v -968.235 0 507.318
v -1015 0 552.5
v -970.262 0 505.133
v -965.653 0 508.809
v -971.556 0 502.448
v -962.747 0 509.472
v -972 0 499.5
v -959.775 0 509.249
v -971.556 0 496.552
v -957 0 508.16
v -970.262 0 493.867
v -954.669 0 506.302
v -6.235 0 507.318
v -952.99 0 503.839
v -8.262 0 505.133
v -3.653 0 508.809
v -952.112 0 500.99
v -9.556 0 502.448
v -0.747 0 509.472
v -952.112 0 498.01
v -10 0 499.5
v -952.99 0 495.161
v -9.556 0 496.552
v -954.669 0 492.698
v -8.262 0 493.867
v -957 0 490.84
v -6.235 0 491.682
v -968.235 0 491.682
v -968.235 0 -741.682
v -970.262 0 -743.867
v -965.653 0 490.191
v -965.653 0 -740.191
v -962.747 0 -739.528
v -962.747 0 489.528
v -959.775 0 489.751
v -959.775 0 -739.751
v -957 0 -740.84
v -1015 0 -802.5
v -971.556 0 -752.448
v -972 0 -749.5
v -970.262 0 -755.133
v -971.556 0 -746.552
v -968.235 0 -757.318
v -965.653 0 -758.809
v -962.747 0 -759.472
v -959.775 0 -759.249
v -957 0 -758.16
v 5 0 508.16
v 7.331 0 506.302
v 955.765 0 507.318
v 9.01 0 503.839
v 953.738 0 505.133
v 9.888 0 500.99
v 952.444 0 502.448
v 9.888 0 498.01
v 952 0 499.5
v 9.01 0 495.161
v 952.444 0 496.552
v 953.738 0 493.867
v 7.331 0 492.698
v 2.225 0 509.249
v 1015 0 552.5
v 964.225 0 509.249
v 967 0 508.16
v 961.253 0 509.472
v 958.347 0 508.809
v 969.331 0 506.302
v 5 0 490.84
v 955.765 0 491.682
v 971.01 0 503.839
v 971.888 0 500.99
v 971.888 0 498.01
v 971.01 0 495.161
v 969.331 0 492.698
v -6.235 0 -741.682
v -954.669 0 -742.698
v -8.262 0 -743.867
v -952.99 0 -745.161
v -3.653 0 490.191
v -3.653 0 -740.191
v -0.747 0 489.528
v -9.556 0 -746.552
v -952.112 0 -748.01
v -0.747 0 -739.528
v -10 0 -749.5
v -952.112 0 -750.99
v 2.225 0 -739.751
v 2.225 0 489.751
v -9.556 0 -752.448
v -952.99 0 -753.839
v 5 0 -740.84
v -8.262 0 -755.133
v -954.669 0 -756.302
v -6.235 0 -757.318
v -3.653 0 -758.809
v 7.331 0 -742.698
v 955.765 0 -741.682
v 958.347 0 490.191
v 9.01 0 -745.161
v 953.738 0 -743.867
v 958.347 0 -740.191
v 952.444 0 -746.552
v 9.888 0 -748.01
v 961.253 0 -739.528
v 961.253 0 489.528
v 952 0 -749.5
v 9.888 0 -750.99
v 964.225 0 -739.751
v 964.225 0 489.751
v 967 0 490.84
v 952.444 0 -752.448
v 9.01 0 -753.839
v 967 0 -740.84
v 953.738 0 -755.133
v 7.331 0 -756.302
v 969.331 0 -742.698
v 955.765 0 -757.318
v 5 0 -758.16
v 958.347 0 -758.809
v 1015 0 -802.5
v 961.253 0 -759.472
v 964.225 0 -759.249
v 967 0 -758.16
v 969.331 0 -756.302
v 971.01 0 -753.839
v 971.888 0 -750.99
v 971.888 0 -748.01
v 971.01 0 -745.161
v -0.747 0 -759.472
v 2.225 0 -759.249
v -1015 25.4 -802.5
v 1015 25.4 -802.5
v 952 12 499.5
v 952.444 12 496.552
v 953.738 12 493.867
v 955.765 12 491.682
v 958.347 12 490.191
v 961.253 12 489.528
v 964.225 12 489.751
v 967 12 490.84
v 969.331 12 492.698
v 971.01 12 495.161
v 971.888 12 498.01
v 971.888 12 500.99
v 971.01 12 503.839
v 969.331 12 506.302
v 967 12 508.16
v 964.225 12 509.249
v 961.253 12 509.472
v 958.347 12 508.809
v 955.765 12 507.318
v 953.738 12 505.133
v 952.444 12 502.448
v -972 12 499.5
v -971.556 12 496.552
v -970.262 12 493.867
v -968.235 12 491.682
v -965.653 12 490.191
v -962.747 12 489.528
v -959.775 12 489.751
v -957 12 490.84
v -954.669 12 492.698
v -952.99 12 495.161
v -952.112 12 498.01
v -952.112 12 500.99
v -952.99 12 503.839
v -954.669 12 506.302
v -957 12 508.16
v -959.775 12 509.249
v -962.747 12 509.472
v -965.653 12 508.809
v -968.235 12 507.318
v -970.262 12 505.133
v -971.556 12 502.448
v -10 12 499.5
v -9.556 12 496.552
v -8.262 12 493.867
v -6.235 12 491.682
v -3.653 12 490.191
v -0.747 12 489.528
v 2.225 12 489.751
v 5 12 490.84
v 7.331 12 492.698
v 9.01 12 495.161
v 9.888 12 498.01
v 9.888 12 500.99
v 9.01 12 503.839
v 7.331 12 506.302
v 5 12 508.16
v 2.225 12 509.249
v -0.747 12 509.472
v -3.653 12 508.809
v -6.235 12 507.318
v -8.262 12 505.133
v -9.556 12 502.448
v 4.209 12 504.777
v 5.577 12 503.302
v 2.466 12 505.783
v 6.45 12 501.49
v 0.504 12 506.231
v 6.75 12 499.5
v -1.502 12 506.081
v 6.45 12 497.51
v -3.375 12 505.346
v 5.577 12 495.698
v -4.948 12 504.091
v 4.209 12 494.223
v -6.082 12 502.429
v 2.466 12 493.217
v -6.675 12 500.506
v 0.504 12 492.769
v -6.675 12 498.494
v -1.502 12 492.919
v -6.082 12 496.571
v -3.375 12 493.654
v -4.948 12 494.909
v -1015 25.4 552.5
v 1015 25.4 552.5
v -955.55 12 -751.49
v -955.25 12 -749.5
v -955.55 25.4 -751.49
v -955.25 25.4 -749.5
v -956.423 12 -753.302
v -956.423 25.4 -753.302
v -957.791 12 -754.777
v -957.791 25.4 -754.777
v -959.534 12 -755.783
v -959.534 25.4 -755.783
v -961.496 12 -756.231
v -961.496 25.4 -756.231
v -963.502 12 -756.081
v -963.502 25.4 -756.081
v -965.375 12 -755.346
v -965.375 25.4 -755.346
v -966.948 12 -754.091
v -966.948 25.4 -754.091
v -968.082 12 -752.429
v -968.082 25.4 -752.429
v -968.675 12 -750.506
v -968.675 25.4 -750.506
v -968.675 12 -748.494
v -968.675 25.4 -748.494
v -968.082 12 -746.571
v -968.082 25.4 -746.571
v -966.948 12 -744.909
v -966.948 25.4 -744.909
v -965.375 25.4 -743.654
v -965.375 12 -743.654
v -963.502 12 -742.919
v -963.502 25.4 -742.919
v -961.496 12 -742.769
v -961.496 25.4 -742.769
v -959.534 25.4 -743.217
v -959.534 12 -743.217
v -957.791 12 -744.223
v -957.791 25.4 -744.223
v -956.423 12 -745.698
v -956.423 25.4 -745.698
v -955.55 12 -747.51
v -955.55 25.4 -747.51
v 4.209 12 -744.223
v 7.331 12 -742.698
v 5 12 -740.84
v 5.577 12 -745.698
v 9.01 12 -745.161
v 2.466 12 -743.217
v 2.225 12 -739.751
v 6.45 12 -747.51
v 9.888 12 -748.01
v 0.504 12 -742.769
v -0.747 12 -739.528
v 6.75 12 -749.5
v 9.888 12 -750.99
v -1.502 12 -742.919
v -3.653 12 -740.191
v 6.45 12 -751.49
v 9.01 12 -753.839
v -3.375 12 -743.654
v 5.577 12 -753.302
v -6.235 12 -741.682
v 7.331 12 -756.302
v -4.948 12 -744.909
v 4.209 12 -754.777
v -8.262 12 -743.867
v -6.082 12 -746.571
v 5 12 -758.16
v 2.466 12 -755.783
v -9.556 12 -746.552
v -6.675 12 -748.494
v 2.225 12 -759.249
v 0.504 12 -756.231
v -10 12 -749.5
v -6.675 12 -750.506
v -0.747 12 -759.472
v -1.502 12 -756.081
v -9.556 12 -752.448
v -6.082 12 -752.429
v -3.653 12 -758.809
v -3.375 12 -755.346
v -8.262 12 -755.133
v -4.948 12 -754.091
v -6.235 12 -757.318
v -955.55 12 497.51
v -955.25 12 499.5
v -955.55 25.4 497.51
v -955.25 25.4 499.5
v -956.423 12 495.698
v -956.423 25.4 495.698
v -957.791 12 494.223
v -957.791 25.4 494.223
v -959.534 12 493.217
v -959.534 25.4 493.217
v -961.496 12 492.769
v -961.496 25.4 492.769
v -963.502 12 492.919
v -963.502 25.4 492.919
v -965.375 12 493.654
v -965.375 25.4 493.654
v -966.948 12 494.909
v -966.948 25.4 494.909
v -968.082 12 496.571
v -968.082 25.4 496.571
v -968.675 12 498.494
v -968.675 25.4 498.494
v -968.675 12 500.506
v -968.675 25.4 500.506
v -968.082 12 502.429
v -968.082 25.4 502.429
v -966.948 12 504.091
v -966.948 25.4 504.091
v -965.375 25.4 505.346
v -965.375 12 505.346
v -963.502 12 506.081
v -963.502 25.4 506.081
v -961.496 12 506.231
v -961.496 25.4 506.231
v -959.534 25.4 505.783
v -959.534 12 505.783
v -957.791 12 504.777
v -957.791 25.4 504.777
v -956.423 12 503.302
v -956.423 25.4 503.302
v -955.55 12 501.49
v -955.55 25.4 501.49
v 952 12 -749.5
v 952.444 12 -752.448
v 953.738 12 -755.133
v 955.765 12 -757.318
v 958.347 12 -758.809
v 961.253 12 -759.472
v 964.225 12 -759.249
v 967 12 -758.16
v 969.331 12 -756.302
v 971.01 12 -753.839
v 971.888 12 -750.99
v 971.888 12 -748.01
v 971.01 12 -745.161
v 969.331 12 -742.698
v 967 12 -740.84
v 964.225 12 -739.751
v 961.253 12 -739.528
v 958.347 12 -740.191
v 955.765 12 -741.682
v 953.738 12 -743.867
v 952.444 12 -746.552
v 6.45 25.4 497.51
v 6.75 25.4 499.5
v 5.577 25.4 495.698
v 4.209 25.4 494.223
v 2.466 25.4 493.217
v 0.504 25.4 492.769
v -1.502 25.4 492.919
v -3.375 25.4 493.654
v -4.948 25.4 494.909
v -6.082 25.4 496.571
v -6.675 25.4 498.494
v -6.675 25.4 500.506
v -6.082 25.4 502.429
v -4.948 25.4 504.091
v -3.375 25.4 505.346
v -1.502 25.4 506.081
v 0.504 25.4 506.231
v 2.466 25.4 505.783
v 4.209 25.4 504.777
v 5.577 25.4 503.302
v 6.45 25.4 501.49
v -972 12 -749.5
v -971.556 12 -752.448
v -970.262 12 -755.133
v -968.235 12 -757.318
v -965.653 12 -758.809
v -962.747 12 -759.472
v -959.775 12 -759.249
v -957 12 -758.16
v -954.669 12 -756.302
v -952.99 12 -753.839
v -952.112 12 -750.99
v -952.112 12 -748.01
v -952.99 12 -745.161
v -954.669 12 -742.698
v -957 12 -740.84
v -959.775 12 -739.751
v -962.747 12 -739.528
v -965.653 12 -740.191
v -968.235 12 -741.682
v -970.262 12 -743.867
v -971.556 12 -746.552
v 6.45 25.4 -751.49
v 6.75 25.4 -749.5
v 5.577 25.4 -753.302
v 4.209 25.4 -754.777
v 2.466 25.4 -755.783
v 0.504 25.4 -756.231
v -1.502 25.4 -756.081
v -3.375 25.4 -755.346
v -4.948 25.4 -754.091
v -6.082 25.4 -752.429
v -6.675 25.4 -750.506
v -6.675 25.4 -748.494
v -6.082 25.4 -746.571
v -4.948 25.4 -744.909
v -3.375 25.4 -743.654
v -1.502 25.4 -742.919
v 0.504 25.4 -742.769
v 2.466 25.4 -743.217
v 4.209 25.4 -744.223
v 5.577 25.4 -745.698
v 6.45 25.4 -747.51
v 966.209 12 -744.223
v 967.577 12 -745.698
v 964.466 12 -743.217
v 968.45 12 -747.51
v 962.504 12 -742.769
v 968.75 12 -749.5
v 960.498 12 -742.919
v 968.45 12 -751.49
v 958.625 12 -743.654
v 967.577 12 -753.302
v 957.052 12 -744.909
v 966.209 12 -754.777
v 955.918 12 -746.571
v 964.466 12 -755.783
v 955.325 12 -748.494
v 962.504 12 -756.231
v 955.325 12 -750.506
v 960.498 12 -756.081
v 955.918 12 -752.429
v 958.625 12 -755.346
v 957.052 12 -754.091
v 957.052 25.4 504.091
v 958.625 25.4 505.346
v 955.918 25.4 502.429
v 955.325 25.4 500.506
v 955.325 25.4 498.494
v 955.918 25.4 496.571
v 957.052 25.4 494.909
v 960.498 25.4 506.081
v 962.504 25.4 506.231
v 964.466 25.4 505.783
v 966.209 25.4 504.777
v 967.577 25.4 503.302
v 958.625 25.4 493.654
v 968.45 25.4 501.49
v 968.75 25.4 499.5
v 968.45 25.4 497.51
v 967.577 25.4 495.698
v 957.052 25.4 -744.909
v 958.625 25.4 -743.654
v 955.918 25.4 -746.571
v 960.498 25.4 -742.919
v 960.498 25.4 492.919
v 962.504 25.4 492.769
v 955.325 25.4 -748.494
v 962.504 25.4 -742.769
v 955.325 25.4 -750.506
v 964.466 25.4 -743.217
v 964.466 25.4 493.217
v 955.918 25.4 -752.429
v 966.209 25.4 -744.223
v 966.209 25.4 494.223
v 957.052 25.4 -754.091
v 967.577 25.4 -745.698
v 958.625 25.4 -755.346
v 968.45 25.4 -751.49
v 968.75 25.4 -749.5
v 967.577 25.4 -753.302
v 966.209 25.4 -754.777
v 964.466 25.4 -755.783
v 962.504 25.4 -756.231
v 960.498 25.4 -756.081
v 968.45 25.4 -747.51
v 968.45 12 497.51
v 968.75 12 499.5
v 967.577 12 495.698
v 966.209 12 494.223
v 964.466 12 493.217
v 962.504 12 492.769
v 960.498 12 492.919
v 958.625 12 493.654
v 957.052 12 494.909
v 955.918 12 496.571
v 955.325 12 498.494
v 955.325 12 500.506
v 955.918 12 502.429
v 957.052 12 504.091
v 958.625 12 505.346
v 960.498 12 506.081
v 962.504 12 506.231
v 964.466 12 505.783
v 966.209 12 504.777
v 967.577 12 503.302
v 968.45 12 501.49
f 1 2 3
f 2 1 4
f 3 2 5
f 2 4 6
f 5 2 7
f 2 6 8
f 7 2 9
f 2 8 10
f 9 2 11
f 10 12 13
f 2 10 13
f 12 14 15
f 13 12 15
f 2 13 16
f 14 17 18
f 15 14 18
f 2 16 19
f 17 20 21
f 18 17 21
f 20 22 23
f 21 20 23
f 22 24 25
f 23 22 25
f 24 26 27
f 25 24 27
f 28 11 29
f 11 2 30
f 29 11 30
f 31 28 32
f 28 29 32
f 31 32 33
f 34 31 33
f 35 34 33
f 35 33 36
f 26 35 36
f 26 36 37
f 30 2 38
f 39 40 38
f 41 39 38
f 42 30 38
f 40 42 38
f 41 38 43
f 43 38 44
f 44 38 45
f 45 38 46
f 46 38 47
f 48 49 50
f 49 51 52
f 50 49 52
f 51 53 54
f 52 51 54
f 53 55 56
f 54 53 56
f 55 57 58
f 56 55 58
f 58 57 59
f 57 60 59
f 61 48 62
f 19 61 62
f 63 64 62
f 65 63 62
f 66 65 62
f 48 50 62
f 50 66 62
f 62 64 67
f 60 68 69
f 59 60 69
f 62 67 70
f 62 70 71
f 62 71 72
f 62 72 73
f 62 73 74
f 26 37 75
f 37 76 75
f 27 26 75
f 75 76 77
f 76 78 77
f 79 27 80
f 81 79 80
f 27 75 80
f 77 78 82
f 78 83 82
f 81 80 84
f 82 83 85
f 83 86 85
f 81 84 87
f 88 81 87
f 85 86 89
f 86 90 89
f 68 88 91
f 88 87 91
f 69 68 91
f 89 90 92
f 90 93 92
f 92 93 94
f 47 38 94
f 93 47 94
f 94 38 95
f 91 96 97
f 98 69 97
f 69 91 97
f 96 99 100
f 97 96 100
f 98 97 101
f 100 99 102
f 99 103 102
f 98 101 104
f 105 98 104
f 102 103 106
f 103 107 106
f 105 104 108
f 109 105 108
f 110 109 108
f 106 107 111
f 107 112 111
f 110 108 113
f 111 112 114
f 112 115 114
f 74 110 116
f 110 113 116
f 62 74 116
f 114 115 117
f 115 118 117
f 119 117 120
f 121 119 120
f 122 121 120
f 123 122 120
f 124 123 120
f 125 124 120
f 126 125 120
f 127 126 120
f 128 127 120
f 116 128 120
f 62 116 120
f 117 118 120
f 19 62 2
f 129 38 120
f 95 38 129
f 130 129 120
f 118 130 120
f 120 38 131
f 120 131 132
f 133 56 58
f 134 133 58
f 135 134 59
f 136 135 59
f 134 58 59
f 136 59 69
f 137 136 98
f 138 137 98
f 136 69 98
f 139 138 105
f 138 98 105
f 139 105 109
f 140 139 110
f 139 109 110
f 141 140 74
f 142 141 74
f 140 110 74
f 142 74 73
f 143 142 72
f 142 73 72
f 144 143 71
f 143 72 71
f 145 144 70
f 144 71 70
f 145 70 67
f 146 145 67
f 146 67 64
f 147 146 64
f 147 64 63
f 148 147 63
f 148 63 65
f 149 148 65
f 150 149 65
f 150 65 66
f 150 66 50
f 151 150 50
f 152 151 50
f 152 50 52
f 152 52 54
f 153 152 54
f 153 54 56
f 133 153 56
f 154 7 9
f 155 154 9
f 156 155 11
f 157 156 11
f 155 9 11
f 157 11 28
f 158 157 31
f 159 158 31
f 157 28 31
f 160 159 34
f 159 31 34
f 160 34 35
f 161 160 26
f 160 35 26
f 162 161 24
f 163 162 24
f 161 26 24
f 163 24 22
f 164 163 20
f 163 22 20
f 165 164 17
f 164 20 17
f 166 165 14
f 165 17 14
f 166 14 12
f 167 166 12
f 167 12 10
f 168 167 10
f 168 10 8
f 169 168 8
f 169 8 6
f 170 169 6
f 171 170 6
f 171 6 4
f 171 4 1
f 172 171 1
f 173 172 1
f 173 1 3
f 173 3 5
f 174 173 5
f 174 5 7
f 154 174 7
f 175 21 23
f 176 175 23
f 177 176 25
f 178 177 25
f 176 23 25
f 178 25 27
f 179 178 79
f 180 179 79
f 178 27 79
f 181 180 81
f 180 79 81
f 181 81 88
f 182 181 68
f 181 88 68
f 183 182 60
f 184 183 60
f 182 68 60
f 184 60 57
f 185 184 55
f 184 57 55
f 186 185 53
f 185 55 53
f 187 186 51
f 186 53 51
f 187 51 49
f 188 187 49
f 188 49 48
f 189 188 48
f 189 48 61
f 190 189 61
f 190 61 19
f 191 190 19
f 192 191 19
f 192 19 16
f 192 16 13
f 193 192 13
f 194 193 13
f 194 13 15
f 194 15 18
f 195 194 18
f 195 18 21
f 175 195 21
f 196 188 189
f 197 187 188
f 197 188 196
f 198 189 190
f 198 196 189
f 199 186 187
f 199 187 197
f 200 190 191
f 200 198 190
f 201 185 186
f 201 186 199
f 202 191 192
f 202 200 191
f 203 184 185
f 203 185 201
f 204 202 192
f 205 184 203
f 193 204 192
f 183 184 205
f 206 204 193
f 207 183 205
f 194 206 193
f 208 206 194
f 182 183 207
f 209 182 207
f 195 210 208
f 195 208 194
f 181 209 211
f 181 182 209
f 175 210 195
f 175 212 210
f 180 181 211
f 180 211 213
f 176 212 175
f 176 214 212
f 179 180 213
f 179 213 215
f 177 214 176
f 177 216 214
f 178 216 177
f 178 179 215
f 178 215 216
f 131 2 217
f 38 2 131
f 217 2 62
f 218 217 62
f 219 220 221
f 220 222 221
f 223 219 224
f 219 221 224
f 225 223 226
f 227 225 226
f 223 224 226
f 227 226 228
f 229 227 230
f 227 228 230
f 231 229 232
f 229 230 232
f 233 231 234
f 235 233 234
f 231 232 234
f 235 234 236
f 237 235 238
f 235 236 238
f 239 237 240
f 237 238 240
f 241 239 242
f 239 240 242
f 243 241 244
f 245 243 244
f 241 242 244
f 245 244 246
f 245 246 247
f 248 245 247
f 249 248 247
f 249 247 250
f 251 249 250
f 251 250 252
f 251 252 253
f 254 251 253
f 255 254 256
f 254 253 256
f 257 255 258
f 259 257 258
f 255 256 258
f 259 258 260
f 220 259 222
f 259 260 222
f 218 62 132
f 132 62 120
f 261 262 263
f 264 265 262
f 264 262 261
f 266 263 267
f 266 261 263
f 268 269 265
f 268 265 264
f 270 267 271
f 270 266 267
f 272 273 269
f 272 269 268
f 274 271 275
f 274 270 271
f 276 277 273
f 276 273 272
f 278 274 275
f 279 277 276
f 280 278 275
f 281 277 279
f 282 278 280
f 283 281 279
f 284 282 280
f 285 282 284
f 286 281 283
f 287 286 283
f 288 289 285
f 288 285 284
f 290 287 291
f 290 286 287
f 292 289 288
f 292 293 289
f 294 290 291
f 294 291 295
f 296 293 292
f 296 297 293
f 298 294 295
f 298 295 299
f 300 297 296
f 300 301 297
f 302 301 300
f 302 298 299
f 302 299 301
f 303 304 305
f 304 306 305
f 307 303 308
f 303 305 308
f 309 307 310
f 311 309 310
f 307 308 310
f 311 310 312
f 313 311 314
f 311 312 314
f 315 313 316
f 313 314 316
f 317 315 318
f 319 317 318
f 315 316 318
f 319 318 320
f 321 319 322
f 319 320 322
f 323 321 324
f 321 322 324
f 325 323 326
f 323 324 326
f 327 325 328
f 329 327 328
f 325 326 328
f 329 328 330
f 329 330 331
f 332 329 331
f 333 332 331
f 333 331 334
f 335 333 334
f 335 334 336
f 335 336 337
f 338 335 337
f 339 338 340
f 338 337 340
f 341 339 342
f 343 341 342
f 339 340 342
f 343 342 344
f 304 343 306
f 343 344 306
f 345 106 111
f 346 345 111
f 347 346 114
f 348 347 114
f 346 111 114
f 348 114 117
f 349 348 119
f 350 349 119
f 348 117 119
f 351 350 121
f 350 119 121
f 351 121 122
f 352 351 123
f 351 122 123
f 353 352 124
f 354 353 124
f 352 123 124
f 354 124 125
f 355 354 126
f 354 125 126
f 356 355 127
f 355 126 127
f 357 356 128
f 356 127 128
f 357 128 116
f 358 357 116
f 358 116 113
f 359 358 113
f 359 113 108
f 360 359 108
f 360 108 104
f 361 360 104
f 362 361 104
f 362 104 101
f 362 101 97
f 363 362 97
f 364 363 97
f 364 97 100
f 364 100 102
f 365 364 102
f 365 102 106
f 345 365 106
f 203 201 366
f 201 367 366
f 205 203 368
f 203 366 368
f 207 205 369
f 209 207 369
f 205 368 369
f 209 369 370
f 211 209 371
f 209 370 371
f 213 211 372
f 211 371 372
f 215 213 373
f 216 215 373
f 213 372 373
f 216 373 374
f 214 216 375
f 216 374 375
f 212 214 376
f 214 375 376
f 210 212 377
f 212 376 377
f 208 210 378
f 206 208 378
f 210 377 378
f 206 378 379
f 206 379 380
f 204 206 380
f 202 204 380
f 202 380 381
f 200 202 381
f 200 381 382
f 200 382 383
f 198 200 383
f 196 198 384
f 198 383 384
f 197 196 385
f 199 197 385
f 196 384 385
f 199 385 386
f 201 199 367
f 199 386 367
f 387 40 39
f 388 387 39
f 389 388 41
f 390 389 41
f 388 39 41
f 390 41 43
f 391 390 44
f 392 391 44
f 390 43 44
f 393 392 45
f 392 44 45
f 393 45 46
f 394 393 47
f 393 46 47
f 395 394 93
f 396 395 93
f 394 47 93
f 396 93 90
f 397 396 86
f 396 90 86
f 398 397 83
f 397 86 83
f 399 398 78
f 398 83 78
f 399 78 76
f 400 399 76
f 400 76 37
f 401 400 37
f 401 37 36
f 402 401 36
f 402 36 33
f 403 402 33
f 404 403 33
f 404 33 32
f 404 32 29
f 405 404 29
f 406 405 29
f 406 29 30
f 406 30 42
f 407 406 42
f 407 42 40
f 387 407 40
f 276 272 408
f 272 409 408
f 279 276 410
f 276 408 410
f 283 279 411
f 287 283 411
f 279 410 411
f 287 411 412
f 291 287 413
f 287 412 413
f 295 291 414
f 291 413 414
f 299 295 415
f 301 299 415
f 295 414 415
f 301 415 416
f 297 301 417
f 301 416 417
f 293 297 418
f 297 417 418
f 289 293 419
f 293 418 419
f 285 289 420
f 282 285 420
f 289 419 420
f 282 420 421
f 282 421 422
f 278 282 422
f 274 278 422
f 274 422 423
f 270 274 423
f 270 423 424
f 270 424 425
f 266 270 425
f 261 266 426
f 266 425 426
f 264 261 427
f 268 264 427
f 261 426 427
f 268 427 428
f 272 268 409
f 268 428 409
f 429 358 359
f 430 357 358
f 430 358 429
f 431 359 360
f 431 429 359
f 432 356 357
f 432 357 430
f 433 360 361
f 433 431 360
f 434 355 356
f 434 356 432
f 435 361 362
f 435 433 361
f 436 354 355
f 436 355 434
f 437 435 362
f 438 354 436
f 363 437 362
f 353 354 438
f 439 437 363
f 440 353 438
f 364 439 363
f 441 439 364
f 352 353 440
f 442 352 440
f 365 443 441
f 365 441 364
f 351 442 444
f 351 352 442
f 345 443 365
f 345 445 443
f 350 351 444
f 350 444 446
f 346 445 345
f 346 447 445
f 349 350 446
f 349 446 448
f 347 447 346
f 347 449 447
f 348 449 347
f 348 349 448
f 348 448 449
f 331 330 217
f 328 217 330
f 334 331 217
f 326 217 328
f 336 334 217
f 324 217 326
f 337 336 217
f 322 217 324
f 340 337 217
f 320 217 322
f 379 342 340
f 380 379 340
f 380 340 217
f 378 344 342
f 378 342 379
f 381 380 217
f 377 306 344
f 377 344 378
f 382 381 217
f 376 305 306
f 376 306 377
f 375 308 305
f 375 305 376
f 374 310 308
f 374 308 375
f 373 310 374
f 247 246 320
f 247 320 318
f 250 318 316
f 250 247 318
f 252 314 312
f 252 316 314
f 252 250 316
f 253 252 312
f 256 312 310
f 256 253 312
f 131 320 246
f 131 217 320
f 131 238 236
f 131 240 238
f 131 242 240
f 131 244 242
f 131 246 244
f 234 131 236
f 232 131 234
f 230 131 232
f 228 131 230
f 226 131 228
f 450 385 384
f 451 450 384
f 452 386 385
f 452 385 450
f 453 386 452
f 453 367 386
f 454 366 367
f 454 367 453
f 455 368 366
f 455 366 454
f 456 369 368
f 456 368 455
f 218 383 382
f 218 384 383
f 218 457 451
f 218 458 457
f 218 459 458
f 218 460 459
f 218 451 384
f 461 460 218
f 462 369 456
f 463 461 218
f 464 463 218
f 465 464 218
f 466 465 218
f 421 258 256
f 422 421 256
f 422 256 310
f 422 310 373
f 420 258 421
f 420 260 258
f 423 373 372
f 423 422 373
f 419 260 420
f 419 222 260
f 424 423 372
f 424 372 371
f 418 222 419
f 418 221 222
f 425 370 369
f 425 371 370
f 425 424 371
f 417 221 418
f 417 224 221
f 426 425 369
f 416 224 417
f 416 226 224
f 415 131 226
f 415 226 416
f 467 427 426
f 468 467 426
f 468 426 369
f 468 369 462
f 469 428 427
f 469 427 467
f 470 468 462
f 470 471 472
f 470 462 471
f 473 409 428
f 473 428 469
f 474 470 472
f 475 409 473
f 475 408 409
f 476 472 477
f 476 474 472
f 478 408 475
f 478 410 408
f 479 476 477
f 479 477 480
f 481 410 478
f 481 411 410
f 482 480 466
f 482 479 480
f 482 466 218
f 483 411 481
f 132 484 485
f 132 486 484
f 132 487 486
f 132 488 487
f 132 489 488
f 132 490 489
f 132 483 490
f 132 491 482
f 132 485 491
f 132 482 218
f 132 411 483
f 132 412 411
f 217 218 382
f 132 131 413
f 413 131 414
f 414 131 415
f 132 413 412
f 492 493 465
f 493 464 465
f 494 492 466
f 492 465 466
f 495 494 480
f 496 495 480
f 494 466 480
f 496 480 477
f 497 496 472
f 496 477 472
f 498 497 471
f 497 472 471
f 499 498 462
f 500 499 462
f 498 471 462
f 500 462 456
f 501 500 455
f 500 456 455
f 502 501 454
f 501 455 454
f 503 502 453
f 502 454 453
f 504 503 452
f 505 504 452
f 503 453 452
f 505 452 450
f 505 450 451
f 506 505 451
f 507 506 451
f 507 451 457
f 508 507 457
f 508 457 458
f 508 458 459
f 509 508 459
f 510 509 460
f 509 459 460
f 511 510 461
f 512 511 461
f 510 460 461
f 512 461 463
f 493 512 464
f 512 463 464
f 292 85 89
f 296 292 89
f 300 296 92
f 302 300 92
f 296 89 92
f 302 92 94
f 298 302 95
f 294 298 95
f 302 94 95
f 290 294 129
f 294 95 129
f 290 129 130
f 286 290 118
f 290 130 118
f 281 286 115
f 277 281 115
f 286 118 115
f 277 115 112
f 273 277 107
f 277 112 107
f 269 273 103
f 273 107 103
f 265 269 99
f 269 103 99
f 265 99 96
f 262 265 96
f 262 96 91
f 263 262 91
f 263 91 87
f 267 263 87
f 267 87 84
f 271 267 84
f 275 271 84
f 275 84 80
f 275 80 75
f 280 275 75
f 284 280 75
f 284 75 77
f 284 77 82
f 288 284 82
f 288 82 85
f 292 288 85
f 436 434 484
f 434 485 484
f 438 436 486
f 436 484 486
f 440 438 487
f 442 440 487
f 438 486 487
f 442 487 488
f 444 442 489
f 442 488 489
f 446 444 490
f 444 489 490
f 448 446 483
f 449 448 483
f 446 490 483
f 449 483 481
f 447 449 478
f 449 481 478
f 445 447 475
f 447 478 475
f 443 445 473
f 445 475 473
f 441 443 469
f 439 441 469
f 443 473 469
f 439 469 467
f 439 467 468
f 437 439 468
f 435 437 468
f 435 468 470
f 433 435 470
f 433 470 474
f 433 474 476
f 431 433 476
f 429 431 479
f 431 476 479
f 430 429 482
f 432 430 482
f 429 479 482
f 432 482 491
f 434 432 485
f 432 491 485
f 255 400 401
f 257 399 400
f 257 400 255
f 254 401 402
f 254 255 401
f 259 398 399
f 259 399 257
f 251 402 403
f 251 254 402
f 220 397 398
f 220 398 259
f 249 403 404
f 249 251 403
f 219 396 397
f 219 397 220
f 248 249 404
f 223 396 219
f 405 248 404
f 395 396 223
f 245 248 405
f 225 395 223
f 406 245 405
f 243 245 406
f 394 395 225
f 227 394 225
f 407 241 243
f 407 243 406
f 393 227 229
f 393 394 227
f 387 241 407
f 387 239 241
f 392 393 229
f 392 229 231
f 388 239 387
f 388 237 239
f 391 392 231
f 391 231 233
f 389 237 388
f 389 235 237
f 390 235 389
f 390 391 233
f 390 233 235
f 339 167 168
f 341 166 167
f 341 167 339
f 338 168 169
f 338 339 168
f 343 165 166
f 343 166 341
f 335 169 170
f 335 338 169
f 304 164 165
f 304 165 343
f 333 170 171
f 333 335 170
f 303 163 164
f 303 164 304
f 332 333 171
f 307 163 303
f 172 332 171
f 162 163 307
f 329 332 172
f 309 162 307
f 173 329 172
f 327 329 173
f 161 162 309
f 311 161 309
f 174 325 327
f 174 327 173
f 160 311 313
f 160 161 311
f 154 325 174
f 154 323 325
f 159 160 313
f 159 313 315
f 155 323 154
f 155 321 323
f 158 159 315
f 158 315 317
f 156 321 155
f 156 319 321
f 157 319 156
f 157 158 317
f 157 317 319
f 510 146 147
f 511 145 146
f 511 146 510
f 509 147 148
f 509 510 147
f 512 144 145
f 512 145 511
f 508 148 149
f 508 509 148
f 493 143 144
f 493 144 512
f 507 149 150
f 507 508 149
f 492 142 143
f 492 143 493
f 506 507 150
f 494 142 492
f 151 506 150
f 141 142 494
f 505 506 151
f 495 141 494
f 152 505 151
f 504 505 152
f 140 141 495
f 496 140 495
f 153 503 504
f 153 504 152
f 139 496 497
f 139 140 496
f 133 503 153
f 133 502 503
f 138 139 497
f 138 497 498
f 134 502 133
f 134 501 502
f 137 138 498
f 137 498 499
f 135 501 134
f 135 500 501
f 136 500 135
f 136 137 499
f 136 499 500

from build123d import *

# Parameters (mm, degrees)
SKETCH1_W                       = 2030
SKETCH1_H                       = 1355
BOSS_EXTRUDE1_DEPTH             = 25.4
CBORE_FOR_M12_SHCS1_D           = 13.5
CBORE_FOR_M12_SHCS1_CBORE_D     = 20
CBORE_FOR_M12_SHCS1_CBORE_DEPTH = 12


with BuildPart() as part:
    # Sketch1 → Boss-Extrude1 (new body)
    with BuildSketch(Plane(origin=(0, 0, 0), x_dir=(1, 0, 0), z_dir=(0, 1, 0))):
        with Locations((0, 125)):
            Rectangle(SKETCH1_W, SKETCH1_H)
    extrude(amount=BOSS_EXTRUDE1_DEPTH)

    # CBORE for M12 SHCS1 (through all)
    with Locations(Plane(origin=(0, 0, 0), x_dir=(-1, 0, 0), z_dir=(0, -1, 0))):
        with Locations((-962, -499.5), (-962, 749.5), (0, 749.5), (962, 749.5), (962, -499.5), (0, -499.5)):
            CounterBoreHole(CBORE_FOR_M12_SHCS1_D / 2, CBORE_FOR_M12_SHCS1_CBORE_D / 2, CBORE_FOR_M12_SHCS1_CBORE_DEPTH)


solid = part.part
